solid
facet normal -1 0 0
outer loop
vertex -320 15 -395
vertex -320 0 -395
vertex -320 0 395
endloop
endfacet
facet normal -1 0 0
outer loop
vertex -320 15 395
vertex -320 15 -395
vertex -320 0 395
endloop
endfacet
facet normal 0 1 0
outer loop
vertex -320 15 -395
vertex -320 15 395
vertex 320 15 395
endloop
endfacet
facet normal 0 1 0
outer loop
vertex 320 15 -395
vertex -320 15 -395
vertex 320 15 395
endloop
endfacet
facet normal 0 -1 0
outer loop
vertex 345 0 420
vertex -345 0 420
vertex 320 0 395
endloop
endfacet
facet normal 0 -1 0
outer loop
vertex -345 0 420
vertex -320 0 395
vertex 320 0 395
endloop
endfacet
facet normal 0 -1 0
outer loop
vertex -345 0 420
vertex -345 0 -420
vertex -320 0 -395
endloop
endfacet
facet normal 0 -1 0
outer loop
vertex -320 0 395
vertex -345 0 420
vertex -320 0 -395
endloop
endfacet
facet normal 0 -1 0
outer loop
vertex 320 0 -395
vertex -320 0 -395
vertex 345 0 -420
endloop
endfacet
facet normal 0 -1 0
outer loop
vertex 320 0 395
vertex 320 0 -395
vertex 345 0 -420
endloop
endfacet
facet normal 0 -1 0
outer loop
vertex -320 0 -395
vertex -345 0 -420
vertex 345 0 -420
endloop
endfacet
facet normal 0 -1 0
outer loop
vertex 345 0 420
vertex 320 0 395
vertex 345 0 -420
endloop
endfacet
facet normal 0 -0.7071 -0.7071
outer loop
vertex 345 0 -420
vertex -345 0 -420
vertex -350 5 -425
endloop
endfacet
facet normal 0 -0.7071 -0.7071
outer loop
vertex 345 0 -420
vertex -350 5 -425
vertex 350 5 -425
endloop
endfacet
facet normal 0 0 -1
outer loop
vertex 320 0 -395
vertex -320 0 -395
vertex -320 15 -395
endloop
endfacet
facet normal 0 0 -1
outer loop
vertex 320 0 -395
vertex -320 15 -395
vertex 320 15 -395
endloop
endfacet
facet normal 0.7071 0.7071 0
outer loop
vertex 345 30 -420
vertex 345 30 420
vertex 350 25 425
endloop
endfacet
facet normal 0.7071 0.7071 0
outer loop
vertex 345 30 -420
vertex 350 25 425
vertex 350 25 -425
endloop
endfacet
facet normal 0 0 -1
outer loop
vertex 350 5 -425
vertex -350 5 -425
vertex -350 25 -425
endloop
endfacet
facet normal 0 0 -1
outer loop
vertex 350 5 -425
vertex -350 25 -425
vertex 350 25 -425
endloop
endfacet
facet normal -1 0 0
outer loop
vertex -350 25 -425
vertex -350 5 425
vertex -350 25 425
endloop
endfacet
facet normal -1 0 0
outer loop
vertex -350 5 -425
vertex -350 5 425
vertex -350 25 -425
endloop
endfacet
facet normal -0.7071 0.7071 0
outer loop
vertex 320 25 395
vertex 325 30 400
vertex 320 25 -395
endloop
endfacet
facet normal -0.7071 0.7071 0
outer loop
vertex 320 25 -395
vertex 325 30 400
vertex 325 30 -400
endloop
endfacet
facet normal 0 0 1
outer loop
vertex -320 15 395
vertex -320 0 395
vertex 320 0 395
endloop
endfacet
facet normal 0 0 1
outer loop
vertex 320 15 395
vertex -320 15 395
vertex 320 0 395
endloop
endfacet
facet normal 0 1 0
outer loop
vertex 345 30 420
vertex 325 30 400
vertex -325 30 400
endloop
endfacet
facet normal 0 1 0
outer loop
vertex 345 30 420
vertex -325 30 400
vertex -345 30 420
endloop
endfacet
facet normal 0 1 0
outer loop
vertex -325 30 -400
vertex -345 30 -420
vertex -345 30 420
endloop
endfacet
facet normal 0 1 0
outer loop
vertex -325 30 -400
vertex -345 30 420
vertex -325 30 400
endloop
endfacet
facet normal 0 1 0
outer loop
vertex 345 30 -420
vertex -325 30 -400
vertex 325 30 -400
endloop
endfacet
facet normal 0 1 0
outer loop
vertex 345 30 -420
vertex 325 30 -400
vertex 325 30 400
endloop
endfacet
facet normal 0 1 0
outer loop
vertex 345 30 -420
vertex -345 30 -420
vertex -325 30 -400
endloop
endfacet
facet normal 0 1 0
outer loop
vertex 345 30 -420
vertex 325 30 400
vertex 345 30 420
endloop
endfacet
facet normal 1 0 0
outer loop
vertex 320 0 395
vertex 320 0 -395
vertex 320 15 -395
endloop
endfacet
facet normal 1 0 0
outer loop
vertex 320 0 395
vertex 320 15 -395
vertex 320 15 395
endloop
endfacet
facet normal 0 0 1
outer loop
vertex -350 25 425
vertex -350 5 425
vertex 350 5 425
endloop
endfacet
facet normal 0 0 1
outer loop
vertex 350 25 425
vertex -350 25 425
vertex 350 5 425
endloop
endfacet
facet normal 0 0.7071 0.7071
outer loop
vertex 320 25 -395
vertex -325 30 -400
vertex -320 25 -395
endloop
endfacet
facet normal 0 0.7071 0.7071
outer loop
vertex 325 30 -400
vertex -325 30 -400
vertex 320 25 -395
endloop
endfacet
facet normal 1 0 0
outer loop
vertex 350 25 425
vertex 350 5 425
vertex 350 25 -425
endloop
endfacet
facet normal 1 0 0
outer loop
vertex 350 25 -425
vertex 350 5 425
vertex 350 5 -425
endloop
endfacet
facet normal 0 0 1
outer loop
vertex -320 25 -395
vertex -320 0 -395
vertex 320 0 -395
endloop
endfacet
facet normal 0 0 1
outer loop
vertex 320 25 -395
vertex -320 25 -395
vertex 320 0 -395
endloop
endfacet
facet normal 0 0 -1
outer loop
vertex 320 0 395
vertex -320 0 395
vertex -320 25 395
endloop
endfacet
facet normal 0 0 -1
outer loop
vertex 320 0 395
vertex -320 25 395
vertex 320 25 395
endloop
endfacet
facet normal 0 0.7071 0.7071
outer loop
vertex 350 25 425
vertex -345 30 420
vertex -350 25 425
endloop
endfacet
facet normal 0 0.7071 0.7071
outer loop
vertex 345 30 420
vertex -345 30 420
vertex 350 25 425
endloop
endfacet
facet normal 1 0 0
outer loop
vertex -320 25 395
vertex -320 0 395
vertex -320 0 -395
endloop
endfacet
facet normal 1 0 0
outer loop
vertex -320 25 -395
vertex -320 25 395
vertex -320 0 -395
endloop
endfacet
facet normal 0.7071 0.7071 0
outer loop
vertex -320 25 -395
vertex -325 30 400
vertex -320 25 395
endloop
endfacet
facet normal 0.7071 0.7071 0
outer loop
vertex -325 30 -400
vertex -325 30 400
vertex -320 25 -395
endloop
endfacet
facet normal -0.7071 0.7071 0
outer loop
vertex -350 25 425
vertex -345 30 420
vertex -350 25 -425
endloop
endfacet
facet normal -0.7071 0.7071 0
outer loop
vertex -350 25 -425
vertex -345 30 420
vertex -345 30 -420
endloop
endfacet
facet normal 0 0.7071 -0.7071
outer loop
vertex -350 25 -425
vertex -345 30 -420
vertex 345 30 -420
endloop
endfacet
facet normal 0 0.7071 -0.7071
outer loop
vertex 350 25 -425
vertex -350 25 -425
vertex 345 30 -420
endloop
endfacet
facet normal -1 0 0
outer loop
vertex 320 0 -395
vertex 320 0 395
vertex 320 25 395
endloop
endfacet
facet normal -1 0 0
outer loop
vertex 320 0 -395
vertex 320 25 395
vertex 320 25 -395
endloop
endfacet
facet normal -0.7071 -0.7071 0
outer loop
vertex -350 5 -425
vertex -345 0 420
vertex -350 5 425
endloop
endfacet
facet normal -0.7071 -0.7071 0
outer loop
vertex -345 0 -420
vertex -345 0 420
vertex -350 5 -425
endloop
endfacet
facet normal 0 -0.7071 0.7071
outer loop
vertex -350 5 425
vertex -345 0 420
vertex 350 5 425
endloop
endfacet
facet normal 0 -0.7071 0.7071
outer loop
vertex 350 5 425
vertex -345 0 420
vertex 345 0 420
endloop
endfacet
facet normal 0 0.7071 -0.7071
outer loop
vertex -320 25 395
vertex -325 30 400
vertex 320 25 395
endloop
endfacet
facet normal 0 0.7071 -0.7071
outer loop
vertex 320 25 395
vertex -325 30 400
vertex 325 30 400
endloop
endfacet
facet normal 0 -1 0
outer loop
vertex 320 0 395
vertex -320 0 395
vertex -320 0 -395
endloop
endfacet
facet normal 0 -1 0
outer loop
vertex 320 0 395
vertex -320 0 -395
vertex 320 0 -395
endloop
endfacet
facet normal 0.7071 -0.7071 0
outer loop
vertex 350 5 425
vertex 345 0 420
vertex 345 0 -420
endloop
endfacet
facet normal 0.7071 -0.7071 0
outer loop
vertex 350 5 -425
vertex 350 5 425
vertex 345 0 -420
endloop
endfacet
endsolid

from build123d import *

# Parameters (mm, degrees)
SKETCH3_W           = 700
SKETCH3_H           = 850
SKETCH3_W_2         = 640
SKETCH3_H_2         = 790
BOSS_EXTRUDE1_DEPTH = 30
CHAMFER2_SIZE       = 5
SKETCH4_W           = 640
SKETCH4_H           = 790
BOSS_EXTRUDE2_DEPTH = 15


with BuildPart() as part:
    # Sketch3 → Boss-Extrude1 (new body)
    with BuildSketch(Plane(origin=(0, 0, 0), x_dir=(1, 0, 0), z_dir=(0, 1, 0))):
        Rectangle(SKETCH3_W, SKETCH3_H)
        Rectangle(SKETCH3_W_2, SKETCH3_H_2, mode=Mode.SUBTRACT)
    extrude(amount=BOSS_EXTRUDE1_DEPTH)

    # Chamfer2
    chamfer2_edges = [part.edges().sort_by_distance(p)[0] for p in [
        (-350, 30, 0),
        (-320, 30, 0),
        (0, 30, 425),
        (0, 30, 395),
        (320, 30, 0),
        (0, 30, -395),
        (350, 30, 0),
        (0, 0, 425),
        (-350, 0, 0),
        (0, 0, -425),
        (350, 0, 0),
        (0, 30, -425),
    ]]
    chamfer(chamfer2_edges, length=CHAMFER2_SIZE)


with BuildPart() as body_2:
    # Sketch4 → Boss-Extrude2 (new body)
    with BuildSketch(Plane.XZ):
        Rectangle(SKETCH4_W, SKETCH4_H)
    extrude(amount=-BOSS_EXTRUDE2_DEPTH)


solid = Compound([part.part, body_2.part])
